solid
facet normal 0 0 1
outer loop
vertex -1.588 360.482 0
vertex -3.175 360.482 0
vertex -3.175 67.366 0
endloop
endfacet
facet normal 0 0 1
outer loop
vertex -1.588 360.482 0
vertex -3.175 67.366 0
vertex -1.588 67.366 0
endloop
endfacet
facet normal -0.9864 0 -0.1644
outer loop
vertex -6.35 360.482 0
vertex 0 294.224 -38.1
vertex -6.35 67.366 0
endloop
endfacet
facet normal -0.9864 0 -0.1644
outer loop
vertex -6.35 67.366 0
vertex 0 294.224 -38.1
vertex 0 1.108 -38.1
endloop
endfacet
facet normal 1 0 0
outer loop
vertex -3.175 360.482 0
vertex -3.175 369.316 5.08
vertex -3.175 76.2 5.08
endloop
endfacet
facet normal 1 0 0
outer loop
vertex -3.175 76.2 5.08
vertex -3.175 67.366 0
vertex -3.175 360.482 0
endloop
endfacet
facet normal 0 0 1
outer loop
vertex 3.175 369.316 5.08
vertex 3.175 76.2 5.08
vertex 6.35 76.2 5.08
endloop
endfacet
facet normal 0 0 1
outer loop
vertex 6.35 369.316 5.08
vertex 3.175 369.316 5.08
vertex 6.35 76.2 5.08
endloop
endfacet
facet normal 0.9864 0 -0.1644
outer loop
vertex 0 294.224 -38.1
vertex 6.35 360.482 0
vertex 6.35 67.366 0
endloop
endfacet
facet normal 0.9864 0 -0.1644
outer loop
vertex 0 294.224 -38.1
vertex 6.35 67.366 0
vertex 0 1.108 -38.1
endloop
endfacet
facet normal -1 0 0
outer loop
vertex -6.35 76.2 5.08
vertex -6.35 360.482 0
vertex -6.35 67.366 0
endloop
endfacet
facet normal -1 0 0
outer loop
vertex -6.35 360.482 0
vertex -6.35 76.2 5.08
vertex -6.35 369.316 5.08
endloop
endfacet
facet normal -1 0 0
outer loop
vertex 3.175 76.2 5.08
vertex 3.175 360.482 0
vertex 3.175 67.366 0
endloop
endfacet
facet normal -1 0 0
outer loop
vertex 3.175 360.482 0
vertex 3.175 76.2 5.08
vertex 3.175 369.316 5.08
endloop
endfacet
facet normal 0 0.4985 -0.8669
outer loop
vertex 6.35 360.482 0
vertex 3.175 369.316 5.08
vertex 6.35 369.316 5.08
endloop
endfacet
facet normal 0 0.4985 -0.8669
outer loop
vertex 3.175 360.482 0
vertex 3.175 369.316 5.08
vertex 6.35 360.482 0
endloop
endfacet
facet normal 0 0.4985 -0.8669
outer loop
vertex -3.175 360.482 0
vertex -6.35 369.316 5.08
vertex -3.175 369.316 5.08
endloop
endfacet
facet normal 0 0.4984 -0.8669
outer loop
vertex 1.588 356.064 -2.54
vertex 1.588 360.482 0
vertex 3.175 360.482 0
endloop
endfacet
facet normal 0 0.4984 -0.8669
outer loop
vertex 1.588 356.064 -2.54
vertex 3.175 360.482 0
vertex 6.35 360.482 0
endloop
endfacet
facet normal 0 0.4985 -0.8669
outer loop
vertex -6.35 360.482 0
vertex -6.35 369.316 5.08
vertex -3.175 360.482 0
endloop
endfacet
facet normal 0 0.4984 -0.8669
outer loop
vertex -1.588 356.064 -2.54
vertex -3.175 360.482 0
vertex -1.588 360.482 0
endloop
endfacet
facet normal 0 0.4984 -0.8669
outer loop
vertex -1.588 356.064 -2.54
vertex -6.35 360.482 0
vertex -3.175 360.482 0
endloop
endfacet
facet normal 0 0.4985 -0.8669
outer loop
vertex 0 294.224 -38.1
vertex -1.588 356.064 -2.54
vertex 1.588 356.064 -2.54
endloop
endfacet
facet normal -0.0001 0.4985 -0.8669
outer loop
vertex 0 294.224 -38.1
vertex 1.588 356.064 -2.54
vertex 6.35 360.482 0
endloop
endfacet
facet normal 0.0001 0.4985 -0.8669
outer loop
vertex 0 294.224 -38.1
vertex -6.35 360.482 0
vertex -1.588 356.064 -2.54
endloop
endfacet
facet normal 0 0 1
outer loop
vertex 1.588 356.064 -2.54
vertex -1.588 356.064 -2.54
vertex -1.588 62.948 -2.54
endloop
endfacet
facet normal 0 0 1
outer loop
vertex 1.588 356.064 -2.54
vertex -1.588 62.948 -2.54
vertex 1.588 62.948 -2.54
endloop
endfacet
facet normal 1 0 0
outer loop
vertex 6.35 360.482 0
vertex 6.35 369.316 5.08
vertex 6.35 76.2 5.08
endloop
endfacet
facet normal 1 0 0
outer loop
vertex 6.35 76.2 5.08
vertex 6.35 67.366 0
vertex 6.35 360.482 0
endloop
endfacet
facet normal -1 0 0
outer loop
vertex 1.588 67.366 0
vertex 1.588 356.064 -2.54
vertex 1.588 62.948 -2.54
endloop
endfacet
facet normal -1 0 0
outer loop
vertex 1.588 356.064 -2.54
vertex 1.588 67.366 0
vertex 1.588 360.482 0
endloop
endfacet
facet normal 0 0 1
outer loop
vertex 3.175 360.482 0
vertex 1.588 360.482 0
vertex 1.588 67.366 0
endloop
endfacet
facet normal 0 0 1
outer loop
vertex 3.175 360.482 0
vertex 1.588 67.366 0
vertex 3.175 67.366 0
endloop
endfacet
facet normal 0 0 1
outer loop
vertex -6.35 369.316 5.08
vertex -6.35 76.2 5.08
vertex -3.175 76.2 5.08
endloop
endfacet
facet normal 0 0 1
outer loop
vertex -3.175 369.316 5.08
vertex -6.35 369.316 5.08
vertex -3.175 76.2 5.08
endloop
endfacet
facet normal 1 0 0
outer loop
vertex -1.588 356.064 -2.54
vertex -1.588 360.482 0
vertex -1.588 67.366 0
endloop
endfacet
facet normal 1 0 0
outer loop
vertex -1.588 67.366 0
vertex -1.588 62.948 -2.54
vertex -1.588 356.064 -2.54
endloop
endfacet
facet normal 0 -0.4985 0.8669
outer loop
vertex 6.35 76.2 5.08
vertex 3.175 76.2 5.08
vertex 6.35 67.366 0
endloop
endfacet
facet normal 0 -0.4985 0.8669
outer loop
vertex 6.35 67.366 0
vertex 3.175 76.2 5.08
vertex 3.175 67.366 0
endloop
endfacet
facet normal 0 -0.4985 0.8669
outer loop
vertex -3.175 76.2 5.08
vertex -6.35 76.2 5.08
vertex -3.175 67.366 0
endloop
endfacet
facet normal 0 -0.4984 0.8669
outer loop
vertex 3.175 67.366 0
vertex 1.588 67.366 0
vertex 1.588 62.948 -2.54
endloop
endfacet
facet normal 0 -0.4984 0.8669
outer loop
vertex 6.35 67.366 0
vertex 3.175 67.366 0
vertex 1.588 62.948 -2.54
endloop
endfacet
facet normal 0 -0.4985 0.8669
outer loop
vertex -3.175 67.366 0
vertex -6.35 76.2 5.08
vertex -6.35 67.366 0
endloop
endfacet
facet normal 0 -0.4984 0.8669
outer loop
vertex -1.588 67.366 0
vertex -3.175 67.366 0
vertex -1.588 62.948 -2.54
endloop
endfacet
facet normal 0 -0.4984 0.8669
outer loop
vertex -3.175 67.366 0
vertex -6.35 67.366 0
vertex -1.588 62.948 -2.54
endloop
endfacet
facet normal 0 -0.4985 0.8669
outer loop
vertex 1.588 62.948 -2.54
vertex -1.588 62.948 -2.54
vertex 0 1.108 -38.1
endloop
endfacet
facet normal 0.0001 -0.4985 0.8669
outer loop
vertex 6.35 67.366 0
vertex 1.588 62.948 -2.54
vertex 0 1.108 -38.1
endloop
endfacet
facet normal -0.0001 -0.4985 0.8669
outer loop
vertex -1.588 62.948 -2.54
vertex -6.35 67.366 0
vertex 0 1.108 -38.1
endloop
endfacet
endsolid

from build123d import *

# Parameters (mm, degrees)
BOSS_EXTRUDE1_DEPTH = 369.316
CUT_EXTRUDE1_DEPTH  = 17.526
CUT_EXTRUDE2_DEPTH  = 17.526


with BuildPart() as part:
    # Sketch1 → Boss-Extrude1 (new body)
    with BuildSketch(Plane(origin=(0, 0, 0), x_dir=(1, 0, 0), z_dir=(0, 1, 0))):
        Polygon((0, 38.1), (-6.35, 0), (-6.35, -5.08), (-3.175, -5.08), (-3.175, 0), (-1.5875, 0), (-1.5875, 2.54), (1.5875, 2.54), (1.5875, 0), (3.175, 0), (3.175, -5.08), (6.35, -5.08), (6.35, 0), align=None)
    extrude(amount=BOSS_EXTRUDE1_DEPTH)

    # Sketch2 → Cut-Extrude1 (cut)
    with BuildSketch(Plane.ZY.offset(6.35)):
        Polygon((5.08, 369.316), (-38.1, 294.223678497), (-38.1, 369.316), align=None)
    extrude(amount=-CUT_EXTRUDE1_DEPTH, mode=Mode.SUBTRACT)

    # Sketch3 → Cut-Extrude2 (cut)
    with BuildSketch(Plane.ZY.offset(6.35)):
        Polygon((5.08, 76.2), (-38.1, 1.107678497), (-38.1, 0), (5.08, 0), align=None)
    extrude(amount=-CUT_EXTRUDE2_DEPTH, mode=Mode.SUBTRACT)


solid = part.part
